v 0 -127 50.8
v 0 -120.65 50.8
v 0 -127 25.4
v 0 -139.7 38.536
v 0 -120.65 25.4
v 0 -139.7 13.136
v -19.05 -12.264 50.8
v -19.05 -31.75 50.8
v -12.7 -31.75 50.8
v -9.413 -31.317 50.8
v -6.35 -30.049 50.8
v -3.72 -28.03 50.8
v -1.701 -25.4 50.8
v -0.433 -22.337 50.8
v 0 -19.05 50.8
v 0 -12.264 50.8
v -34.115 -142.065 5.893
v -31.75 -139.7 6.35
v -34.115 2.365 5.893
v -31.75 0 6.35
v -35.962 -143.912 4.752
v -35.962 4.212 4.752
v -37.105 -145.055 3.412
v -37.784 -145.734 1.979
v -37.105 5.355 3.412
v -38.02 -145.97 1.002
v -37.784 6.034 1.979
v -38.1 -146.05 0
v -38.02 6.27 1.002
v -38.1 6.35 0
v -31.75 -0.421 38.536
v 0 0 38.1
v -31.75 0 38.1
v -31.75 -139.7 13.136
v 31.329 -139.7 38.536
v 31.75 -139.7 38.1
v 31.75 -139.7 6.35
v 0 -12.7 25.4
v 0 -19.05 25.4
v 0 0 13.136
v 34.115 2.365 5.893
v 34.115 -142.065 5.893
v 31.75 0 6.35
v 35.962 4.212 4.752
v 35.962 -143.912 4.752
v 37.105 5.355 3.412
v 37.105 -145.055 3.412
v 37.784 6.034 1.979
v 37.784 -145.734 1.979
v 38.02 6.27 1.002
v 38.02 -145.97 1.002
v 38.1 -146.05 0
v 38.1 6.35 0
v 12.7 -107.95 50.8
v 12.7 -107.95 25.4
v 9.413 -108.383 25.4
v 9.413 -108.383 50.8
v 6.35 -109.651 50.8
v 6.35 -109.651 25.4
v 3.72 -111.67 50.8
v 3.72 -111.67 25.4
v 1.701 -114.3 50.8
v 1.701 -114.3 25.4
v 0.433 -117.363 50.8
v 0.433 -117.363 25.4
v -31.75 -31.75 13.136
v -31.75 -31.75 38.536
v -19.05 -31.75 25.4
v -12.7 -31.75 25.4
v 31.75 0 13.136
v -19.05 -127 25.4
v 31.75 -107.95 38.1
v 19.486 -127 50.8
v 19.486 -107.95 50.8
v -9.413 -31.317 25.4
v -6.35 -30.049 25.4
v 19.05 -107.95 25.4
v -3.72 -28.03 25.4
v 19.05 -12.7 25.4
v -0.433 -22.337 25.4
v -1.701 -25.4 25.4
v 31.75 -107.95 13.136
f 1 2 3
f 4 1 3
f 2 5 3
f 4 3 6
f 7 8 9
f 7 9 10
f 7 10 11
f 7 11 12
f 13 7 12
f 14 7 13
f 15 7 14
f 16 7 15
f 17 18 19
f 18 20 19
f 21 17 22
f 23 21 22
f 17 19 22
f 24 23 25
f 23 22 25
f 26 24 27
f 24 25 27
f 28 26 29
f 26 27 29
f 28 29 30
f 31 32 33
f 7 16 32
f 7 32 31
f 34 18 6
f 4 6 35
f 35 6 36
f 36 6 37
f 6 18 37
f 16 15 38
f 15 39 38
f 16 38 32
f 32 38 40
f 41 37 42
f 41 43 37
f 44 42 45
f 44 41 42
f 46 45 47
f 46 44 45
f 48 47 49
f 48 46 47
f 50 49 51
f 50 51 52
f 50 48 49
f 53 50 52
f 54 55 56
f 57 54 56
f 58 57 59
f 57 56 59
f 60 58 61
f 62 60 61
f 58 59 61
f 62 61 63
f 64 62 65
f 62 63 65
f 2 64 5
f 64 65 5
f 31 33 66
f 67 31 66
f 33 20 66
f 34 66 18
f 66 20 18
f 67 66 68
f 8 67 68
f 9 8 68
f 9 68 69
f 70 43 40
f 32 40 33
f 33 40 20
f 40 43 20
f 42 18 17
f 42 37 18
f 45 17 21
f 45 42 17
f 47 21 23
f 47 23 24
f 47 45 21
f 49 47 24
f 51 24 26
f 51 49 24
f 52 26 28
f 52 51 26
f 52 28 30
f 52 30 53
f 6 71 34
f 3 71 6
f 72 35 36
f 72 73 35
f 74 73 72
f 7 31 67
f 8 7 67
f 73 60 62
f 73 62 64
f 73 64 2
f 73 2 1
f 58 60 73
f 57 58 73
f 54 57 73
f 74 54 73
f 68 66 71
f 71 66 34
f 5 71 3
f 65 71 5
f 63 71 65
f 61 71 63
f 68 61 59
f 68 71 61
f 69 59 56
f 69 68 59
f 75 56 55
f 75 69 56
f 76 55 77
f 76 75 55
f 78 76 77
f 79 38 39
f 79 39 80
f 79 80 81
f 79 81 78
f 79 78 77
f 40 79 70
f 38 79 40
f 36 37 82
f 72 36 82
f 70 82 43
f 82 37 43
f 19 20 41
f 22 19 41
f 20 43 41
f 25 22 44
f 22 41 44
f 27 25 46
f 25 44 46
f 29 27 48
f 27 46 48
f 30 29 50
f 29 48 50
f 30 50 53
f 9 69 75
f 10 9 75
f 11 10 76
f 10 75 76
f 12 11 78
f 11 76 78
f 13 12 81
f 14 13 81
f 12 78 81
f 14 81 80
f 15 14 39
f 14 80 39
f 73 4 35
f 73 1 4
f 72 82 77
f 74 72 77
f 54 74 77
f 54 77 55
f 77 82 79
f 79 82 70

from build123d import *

# Parameters (mm, degrees)
F0_W        = 76.2
F0_H        = 152.4
F1_DEPTH    = 6.35
F2_DEPTH    = 25.4
F3_DEPTH    = 50.8
F4_C1_SIZE2 = 12.7
F4_C1_SIZE  = 12.26424744
F4_C2_SIZE2 = 12.7
F4_C2_SIZE  = 12.26424744
F4_C3_SIZE2 = 12.26424744
F4_C3_SIZE  = 12.7
F4_C4_SIZE2 = 12.7
F4_C4_SIZE  = 12.26424744
F4_C5_SIZE2 = 12.26424744
F4_C5_SIZE  = 12.7
F4_C6_SIZE2 = 12.26424744
F4_C6_SIZE  = 12.7
F4_C7_SIZE2 = 12.26424744
F4_C7_SIZE  = 12.7
F4_C8_SIZE2 = 12.26424744
F4_C8_SIZE  = 12.7
F5_R        = 6.34999


# Not quite as in the source:
# - a fillet or chamfer is up to 0.001 mm smaller than in the source, because OpenCascade refuses the exact size


with BuildPart() as f1:
    # F0 (on Top) → F1 (new body)
    with BuildSketch(Plane.XY):
        with Locations((0, -69.85)):
            Rectangle(F0_W, F0_H)
        Polygon((-31.75, -31.75), (-31.75, 0), (0, 0), (31.75, 0), (31.75, -107.95), (31.75, -139.7), (0, -139.7), (-31.75, -139.7), align=None, mode=Mode.SUBTRACT)
    extrude(amount=F1_DEPTH)

    # F0 (on Top) → F2 (join)
    with BuildSketch(Plane.XY):
        with BuildLine():
            Line((31.75, 0), (0, 0))
            Line((0, 0), (0, -19.05))
            ThreePointArc((0, -19.05), (-3.7197438789, -28.0302561211), (-12.7, -31.75))
            Line((-12.7, -31.75), (-31.75, -31.75))
            Line((-31.75, -31.75), (-31.75, -139.7))
            Line((-31.75, -139.7), (0, -139.7))
            Line((0, -139.7), (0, -120.65))
            ThreePointArc((0, -120.65), (3.7197438789, -111.6697438789), (12.7, -107.95))
            Line((12.7, -107.95), (31.75, -107.95))
            Line((31.75, -107.95), (31.75, 0))
        make_face()
    extrude(amount=F2_DEPTH)

    # F0 (on Top) → F3 (join)
    with BuildSketch(Plane.XY):
        with BuildLine():
            Line((0, 0), (-31.75, 0))
            Line((-31.75, 0), (-31.75, -31.75))
            Line((-31.75, -31.75), (-12.7, -31.75))
            ThreePointArc((-12.7, -31.75), (-3.7197438789, -28.0302561211), (0, -19.05))
            Line((0, -19.05), (0, 0))
        make_face()
        with BuildLine():
            Line((31.75, -139.7), (31.75, -107.95))
            Line((31.75, -107.95), (12.7, -107.95))
            ThreePointArc((12.7, -107.95), (3.7197438789, -111.6697438789), (0, -120.65))
            Line((0, -120.65), (0, -139.7))
            Line((0, -139.7), (31.75, -139.7))
        make_face()
    extrude(amount=F3_DEPTH)

    # F4: chamfer of 12.7 x 12.26424744 on 8 edges, made by hand

    # F4_c1
    f4_c1_edges = [f1.edges().sort_by_distance(p)[0] for p in [
        (-15.875, -139.7, 25.4),
    ]]
    f4_c1_side = f1.faces().sort_by_distance((-15.875, -139.7, 25.1547150512))[0]
    chamfer(f4_c1_edges, length=F4_C1_SIZE, length2=F4_C1_SIZE2, reference=f4_c1_side)

    # F4_c2
    f4_c2_edges = [f1.edges().sort_by_distance(p)[0] for p in [
        (15.875, -139.7, 50.8),
    ]]
    f4_c2_side = f1.faces().sort_by_distance((15.875, -139.7, 50.5547150512))[0]
    chamfer(f4_c2_edges, length=F4_C2_SIZE, length2=F4_C2_SIZE2, reference=f4_c2_side)

    # F4_c3
    f4_c3_edges = [f1.edges().sort_by_distance(p)[0] for p in [
        (31.75, -117.475, 50.8),
    ]]
    f4_c3_side = f1.faces().sort_by_distance((31.75, -117.475, 50.5547150512))[0]
    chamfer(f4_c3_edges, length=F4_C3_SIZE, length2=F4_C3_SIZE2, reference=f4_c3_side)

    # F4_c4
    f4_c4_edges = [f1.edges().sort_by_distance(p)[0] for p in [
        (15.875, 0, 25.4),
    ]]
    f4_c4_side = f1.faces().sort_by_distance((15.875, 0, 25.1547150512))[0]
    chamfer(f4_c4_edges, length=F4_C4_SIZE, length2=F4_C4_SIZE2, reference=f4_c4_side)

    # F4_c5
    f4_c5_edges = [f1.edges().sort_by_distance(p)[0] for p in [
        (-31.75, -79.375, 25.4),
    ]]
    f4_c5_side = f1.faces().sort_by_distance((-31.5047150512, -79.375, 25.4))[0]
    chamfer(f4_c5_edges, length=F4_C5_SIZE, length2=F4_C5_SIZE2, reference=f4_c5_side)

    # F4_c6
    f4_c6_edges = [f1.edges().sort_by_distance(p)[0] for p in [
        (31.75, -60.325, 25.4),
    ]]
    f4_c6_side = f1.faces().sort_by_distance((31.5047150512, -60.325, 25.4))[0]
    chamfer(f4_c6_edges, length=F4_C6_SIZE, length2=F4_C6_SIZE2, reference=f4_c6_side)

    # F4_c7
    f4_c7_edges = [f1.edges().sort_by_distance(p)[0] for p in [
        (-15.875, 0, 50.8),
    ]]
    f4_c7_side = f1.faces().sort_by_distance((-15.875, 0, 50.5547150512))[0]
    chamfer(f4_c7_edges, length=F4_C7_SIZE, length2=F4_C7_SIZE2, reference=f4_c7_side)

    # F4_c8
    f4_c8_edges = [f1.edges().sort_by_distance(p)[0] for p in [
        (-31.75, -22.00712372, 50.8),
    ]]
    f4_c8_side = f1.faces().sort_by_distance((-31.5047150512, -22.00712372, 50.8))[0]
    chamfer(f4_c8_edges, length=F4_C8_SIZE, length2=F4_C8_SIZE2, reference=f4_c8_side)

    # F5 (radius 6.35 in the source; OpenCascade refuses exactly that, so slightly less here)
    f5_edges = [f1.edges().sort_by_distance(p)[0] for p in [
        (38.1, -69.85, 6.35),
        (0, 6.35, 6.35),
        (-38.1, -69.85, 6.35),
        (0, -146.05, 6.35),
    ]]
    fillet(f5_edges, radius=F5_R)


solid = f1.part
